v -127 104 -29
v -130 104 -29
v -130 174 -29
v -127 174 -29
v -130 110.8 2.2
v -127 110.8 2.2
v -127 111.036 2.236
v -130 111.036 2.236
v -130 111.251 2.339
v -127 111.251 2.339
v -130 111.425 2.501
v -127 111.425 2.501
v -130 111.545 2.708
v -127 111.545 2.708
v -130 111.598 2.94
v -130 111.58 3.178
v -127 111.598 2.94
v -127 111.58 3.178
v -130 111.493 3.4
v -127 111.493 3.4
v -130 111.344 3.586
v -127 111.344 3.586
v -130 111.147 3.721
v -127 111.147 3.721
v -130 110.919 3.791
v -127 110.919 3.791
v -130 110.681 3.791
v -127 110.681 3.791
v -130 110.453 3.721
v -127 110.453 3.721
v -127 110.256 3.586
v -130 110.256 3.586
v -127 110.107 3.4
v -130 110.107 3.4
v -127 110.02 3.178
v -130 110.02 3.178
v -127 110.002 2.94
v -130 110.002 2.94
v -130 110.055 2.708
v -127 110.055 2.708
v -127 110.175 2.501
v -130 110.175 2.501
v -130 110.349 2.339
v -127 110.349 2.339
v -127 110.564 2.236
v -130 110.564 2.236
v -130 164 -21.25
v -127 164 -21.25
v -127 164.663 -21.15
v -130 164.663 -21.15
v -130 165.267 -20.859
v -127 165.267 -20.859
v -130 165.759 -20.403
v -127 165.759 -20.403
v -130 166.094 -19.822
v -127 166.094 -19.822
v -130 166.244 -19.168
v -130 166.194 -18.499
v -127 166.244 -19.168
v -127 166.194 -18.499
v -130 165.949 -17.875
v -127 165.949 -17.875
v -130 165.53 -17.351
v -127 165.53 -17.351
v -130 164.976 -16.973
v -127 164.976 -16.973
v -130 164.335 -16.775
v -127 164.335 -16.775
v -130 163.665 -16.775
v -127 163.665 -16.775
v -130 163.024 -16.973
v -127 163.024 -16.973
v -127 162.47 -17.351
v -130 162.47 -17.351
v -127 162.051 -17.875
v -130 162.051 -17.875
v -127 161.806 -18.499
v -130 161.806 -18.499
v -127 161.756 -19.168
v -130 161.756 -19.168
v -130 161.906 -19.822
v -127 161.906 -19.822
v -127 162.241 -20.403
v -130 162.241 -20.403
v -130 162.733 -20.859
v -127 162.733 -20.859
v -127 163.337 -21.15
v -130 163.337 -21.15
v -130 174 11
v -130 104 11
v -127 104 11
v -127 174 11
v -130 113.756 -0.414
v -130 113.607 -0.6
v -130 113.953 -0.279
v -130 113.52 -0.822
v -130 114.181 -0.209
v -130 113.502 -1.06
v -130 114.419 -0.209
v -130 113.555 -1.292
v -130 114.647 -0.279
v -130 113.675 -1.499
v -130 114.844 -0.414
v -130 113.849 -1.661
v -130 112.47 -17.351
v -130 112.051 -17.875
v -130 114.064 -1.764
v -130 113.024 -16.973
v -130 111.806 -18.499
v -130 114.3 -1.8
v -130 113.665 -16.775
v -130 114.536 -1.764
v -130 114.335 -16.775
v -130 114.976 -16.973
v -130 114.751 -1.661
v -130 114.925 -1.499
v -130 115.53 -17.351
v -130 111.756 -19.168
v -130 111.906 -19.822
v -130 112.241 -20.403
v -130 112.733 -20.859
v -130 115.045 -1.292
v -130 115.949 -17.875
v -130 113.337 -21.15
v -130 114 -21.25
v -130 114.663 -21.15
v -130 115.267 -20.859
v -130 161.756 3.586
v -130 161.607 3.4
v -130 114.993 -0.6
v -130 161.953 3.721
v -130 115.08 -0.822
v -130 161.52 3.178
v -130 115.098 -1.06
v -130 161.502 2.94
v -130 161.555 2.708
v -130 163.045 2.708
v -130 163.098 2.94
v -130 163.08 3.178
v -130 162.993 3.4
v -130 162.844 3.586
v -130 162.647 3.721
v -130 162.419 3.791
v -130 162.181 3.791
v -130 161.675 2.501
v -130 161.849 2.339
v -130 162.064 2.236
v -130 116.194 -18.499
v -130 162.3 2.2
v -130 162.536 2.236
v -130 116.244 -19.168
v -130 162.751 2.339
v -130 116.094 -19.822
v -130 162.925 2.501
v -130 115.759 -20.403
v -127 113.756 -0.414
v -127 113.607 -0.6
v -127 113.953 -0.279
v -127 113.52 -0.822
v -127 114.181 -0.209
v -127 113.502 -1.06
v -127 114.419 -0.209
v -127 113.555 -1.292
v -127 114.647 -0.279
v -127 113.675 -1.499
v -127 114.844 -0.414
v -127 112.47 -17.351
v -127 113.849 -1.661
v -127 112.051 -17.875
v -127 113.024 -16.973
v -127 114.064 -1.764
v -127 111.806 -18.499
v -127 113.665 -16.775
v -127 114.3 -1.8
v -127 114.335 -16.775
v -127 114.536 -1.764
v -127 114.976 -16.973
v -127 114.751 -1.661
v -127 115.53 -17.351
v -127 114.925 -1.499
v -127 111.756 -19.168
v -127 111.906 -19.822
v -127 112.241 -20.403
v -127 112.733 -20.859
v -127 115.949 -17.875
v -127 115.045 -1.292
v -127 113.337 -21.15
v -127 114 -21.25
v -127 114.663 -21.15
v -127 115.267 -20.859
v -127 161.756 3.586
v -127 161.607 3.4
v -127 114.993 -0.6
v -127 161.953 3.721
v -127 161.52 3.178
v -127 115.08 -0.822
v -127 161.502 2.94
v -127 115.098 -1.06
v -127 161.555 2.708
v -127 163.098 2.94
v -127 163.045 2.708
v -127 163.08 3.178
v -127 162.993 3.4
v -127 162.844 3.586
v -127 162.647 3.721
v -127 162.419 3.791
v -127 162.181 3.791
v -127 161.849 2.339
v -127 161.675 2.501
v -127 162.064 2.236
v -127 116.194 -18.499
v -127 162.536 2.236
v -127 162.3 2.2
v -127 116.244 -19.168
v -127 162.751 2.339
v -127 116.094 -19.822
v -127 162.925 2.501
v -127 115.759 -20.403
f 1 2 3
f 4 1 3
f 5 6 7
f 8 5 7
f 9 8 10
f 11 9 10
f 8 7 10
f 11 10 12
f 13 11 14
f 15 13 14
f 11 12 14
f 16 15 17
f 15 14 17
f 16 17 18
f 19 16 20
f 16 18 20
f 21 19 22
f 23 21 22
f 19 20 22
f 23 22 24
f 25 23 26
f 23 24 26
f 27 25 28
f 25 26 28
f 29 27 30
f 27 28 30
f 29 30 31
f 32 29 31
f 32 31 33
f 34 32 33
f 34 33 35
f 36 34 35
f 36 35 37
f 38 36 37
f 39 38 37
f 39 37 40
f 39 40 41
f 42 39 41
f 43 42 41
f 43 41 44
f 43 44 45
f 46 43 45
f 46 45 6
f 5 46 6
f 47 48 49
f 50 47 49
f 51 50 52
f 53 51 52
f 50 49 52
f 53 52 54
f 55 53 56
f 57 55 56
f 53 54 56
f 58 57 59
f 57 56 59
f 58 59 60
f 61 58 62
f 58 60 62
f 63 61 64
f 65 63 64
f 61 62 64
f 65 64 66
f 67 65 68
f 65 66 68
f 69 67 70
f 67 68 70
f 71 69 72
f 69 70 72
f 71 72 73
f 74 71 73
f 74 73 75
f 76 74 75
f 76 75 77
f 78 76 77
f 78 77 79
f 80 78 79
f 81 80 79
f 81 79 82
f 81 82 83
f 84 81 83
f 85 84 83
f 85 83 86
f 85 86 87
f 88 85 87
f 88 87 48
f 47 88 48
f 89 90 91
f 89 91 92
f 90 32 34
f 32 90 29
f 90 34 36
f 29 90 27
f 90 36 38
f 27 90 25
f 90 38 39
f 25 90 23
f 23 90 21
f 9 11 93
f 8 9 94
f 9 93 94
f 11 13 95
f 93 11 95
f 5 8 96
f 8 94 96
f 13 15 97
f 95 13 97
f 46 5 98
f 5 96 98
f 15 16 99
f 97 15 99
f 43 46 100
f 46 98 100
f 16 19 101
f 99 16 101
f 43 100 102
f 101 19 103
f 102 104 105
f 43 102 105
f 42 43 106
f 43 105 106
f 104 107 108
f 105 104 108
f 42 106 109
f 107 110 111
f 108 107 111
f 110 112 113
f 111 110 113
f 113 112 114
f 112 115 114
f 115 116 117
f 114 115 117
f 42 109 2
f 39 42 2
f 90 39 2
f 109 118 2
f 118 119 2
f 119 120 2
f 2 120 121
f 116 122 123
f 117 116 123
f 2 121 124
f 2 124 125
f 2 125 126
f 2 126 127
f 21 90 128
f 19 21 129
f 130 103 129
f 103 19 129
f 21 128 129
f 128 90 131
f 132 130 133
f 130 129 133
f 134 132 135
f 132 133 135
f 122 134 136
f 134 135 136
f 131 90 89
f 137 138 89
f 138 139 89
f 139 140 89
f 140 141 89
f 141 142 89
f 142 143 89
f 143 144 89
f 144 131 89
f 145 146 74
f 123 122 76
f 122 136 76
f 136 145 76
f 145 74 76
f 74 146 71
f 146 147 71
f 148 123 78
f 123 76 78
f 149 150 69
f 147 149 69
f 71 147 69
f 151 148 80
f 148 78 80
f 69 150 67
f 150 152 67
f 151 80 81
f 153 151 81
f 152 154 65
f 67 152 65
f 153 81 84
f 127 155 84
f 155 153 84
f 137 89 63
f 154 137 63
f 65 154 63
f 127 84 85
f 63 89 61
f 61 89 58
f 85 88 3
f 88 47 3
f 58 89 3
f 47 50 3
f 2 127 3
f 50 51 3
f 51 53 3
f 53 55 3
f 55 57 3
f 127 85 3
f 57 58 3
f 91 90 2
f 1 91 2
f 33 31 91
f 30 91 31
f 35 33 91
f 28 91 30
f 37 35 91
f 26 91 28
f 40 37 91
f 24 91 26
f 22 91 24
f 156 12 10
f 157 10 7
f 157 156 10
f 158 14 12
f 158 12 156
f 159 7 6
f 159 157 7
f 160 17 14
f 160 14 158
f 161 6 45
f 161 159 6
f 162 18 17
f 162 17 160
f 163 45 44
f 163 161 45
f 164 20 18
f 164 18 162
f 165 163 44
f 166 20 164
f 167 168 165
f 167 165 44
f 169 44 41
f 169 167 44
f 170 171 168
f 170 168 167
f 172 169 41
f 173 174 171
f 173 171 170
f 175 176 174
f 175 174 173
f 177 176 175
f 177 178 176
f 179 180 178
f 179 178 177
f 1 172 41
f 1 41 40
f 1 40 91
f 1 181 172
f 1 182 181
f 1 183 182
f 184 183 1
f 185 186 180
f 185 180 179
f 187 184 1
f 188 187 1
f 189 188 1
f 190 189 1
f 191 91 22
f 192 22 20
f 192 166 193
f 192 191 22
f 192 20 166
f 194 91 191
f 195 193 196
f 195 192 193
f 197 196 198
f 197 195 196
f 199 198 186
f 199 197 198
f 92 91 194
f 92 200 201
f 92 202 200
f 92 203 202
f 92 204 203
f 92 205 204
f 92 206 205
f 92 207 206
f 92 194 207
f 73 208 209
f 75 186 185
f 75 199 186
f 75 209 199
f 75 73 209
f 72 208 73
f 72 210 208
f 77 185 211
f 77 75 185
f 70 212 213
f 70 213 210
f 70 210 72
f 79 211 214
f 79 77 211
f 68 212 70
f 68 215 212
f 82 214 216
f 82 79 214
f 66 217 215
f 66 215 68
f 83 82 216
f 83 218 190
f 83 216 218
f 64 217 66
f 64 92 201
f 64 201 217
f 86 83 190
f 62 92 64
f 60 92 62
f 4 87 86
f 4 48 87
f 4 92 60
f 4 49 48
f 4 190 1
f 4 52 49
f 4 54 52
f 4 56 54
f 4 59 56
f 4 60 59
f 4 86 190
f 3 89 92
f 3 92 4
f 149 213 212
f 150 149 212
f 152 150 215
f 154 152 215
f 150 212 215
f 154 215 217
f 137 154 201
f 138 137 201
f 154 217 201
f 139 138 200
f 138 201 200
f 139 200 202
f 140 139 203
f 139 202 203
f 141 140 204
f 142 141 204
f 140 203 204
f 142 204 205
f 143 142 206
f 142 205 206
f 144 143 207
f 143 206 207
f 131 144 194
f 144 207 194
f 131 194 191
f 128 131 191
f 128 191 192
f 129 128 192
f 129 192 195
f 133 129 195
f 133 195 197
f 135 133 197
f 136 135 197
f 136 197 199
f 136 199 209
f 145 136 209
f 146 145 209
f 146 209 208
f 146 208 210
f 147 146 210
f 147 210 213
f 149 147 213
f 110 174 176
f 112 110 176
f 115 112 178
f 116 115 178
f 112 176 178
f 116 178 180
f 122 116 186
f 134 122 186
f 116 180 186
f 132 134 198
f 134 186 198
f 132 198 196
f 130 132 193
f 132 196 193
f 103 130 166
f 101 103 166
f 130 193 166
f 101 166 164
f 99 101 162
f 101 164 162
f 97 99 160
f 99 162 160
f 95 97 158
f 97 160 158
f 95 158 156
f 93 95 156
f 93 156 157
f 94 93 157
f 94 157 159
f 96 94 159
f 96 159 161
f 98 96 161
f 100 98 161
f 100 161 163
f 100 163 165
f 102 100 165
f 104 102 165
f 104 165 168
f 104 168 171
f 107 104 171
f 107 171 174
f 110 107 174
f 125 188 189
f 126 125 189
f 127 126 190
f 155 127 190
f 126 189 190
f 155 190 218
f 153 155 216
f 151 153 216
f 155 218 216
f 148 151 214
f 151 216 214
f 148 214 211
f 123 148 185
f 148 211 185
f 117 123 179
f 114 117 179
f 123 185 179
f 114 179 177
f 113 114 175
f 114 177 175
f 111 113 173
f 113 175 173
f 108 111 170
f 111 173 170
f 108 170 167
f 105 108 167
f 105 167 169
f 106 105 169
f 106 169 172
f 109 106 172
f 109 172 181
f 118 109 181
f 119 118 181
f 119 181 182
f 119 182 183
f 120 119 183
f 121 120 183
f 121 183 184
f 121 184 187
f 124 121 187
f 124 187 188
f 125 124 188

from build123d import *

# Parameters (mm, degrees)
SKETCH001_W             = 40
SKETCH001_H             = 70
PAD001_DEPTH            = 3
SKETCH002_R             = 2.25
HOLE_DEPTH              = 3.001
SKETCH003_R             = 0.8
HOLE001_DEPTH           = 3.001
BODY001_PLACEMENT_ANGLE = 90


with BuildPart() as part:
    # Sketch001 → Pad001 (new body)
    with BuildSketch(Plane.XY):
        Rectangle(SKETCH001_W, SKETCH001_H)
    extrude(amount=PAD001_DEPTH)

    # Sketch002 (on Face6 of Pad001) → Hole (cut, through all)
    with BuildSketch(Plane.XY.offset(3)):
        with Locations((10, 25)):
            Circle(SKETCH002_R)
        with Locations((10, -25)):
            Circle(SKETCH002_R)
    extrude(amount=-HOLE_DEPTH, mode=Mode.SUBTRACT)

    # Sketch003 (on Face5 of Hole) → Hole001 (cut, through all)
    with BuildSketch(Plane.XY.offset(3)):
        with Locations((-12, 23.3)):
            Circle(SKETCH003_R)
        with Locations((-12, -28.2)):
            Circle(SKETCH003_R)
        with Locations((-8, -24.7)):
            Circle(SKETCH003_R)
    extrude(amount=-HOLE001_DEPTH, mode=Mode.SUBTRACT)


with BuildPart() as part_1:
    # Body001 placement: moved
    add(part.part.moved(Location((-130, 139, -9))).rotate(Axis((-130, 139, -9), (0, 1, 0)), BODY001_PLACEMENT_ANGLE))


solid = part_1.part
